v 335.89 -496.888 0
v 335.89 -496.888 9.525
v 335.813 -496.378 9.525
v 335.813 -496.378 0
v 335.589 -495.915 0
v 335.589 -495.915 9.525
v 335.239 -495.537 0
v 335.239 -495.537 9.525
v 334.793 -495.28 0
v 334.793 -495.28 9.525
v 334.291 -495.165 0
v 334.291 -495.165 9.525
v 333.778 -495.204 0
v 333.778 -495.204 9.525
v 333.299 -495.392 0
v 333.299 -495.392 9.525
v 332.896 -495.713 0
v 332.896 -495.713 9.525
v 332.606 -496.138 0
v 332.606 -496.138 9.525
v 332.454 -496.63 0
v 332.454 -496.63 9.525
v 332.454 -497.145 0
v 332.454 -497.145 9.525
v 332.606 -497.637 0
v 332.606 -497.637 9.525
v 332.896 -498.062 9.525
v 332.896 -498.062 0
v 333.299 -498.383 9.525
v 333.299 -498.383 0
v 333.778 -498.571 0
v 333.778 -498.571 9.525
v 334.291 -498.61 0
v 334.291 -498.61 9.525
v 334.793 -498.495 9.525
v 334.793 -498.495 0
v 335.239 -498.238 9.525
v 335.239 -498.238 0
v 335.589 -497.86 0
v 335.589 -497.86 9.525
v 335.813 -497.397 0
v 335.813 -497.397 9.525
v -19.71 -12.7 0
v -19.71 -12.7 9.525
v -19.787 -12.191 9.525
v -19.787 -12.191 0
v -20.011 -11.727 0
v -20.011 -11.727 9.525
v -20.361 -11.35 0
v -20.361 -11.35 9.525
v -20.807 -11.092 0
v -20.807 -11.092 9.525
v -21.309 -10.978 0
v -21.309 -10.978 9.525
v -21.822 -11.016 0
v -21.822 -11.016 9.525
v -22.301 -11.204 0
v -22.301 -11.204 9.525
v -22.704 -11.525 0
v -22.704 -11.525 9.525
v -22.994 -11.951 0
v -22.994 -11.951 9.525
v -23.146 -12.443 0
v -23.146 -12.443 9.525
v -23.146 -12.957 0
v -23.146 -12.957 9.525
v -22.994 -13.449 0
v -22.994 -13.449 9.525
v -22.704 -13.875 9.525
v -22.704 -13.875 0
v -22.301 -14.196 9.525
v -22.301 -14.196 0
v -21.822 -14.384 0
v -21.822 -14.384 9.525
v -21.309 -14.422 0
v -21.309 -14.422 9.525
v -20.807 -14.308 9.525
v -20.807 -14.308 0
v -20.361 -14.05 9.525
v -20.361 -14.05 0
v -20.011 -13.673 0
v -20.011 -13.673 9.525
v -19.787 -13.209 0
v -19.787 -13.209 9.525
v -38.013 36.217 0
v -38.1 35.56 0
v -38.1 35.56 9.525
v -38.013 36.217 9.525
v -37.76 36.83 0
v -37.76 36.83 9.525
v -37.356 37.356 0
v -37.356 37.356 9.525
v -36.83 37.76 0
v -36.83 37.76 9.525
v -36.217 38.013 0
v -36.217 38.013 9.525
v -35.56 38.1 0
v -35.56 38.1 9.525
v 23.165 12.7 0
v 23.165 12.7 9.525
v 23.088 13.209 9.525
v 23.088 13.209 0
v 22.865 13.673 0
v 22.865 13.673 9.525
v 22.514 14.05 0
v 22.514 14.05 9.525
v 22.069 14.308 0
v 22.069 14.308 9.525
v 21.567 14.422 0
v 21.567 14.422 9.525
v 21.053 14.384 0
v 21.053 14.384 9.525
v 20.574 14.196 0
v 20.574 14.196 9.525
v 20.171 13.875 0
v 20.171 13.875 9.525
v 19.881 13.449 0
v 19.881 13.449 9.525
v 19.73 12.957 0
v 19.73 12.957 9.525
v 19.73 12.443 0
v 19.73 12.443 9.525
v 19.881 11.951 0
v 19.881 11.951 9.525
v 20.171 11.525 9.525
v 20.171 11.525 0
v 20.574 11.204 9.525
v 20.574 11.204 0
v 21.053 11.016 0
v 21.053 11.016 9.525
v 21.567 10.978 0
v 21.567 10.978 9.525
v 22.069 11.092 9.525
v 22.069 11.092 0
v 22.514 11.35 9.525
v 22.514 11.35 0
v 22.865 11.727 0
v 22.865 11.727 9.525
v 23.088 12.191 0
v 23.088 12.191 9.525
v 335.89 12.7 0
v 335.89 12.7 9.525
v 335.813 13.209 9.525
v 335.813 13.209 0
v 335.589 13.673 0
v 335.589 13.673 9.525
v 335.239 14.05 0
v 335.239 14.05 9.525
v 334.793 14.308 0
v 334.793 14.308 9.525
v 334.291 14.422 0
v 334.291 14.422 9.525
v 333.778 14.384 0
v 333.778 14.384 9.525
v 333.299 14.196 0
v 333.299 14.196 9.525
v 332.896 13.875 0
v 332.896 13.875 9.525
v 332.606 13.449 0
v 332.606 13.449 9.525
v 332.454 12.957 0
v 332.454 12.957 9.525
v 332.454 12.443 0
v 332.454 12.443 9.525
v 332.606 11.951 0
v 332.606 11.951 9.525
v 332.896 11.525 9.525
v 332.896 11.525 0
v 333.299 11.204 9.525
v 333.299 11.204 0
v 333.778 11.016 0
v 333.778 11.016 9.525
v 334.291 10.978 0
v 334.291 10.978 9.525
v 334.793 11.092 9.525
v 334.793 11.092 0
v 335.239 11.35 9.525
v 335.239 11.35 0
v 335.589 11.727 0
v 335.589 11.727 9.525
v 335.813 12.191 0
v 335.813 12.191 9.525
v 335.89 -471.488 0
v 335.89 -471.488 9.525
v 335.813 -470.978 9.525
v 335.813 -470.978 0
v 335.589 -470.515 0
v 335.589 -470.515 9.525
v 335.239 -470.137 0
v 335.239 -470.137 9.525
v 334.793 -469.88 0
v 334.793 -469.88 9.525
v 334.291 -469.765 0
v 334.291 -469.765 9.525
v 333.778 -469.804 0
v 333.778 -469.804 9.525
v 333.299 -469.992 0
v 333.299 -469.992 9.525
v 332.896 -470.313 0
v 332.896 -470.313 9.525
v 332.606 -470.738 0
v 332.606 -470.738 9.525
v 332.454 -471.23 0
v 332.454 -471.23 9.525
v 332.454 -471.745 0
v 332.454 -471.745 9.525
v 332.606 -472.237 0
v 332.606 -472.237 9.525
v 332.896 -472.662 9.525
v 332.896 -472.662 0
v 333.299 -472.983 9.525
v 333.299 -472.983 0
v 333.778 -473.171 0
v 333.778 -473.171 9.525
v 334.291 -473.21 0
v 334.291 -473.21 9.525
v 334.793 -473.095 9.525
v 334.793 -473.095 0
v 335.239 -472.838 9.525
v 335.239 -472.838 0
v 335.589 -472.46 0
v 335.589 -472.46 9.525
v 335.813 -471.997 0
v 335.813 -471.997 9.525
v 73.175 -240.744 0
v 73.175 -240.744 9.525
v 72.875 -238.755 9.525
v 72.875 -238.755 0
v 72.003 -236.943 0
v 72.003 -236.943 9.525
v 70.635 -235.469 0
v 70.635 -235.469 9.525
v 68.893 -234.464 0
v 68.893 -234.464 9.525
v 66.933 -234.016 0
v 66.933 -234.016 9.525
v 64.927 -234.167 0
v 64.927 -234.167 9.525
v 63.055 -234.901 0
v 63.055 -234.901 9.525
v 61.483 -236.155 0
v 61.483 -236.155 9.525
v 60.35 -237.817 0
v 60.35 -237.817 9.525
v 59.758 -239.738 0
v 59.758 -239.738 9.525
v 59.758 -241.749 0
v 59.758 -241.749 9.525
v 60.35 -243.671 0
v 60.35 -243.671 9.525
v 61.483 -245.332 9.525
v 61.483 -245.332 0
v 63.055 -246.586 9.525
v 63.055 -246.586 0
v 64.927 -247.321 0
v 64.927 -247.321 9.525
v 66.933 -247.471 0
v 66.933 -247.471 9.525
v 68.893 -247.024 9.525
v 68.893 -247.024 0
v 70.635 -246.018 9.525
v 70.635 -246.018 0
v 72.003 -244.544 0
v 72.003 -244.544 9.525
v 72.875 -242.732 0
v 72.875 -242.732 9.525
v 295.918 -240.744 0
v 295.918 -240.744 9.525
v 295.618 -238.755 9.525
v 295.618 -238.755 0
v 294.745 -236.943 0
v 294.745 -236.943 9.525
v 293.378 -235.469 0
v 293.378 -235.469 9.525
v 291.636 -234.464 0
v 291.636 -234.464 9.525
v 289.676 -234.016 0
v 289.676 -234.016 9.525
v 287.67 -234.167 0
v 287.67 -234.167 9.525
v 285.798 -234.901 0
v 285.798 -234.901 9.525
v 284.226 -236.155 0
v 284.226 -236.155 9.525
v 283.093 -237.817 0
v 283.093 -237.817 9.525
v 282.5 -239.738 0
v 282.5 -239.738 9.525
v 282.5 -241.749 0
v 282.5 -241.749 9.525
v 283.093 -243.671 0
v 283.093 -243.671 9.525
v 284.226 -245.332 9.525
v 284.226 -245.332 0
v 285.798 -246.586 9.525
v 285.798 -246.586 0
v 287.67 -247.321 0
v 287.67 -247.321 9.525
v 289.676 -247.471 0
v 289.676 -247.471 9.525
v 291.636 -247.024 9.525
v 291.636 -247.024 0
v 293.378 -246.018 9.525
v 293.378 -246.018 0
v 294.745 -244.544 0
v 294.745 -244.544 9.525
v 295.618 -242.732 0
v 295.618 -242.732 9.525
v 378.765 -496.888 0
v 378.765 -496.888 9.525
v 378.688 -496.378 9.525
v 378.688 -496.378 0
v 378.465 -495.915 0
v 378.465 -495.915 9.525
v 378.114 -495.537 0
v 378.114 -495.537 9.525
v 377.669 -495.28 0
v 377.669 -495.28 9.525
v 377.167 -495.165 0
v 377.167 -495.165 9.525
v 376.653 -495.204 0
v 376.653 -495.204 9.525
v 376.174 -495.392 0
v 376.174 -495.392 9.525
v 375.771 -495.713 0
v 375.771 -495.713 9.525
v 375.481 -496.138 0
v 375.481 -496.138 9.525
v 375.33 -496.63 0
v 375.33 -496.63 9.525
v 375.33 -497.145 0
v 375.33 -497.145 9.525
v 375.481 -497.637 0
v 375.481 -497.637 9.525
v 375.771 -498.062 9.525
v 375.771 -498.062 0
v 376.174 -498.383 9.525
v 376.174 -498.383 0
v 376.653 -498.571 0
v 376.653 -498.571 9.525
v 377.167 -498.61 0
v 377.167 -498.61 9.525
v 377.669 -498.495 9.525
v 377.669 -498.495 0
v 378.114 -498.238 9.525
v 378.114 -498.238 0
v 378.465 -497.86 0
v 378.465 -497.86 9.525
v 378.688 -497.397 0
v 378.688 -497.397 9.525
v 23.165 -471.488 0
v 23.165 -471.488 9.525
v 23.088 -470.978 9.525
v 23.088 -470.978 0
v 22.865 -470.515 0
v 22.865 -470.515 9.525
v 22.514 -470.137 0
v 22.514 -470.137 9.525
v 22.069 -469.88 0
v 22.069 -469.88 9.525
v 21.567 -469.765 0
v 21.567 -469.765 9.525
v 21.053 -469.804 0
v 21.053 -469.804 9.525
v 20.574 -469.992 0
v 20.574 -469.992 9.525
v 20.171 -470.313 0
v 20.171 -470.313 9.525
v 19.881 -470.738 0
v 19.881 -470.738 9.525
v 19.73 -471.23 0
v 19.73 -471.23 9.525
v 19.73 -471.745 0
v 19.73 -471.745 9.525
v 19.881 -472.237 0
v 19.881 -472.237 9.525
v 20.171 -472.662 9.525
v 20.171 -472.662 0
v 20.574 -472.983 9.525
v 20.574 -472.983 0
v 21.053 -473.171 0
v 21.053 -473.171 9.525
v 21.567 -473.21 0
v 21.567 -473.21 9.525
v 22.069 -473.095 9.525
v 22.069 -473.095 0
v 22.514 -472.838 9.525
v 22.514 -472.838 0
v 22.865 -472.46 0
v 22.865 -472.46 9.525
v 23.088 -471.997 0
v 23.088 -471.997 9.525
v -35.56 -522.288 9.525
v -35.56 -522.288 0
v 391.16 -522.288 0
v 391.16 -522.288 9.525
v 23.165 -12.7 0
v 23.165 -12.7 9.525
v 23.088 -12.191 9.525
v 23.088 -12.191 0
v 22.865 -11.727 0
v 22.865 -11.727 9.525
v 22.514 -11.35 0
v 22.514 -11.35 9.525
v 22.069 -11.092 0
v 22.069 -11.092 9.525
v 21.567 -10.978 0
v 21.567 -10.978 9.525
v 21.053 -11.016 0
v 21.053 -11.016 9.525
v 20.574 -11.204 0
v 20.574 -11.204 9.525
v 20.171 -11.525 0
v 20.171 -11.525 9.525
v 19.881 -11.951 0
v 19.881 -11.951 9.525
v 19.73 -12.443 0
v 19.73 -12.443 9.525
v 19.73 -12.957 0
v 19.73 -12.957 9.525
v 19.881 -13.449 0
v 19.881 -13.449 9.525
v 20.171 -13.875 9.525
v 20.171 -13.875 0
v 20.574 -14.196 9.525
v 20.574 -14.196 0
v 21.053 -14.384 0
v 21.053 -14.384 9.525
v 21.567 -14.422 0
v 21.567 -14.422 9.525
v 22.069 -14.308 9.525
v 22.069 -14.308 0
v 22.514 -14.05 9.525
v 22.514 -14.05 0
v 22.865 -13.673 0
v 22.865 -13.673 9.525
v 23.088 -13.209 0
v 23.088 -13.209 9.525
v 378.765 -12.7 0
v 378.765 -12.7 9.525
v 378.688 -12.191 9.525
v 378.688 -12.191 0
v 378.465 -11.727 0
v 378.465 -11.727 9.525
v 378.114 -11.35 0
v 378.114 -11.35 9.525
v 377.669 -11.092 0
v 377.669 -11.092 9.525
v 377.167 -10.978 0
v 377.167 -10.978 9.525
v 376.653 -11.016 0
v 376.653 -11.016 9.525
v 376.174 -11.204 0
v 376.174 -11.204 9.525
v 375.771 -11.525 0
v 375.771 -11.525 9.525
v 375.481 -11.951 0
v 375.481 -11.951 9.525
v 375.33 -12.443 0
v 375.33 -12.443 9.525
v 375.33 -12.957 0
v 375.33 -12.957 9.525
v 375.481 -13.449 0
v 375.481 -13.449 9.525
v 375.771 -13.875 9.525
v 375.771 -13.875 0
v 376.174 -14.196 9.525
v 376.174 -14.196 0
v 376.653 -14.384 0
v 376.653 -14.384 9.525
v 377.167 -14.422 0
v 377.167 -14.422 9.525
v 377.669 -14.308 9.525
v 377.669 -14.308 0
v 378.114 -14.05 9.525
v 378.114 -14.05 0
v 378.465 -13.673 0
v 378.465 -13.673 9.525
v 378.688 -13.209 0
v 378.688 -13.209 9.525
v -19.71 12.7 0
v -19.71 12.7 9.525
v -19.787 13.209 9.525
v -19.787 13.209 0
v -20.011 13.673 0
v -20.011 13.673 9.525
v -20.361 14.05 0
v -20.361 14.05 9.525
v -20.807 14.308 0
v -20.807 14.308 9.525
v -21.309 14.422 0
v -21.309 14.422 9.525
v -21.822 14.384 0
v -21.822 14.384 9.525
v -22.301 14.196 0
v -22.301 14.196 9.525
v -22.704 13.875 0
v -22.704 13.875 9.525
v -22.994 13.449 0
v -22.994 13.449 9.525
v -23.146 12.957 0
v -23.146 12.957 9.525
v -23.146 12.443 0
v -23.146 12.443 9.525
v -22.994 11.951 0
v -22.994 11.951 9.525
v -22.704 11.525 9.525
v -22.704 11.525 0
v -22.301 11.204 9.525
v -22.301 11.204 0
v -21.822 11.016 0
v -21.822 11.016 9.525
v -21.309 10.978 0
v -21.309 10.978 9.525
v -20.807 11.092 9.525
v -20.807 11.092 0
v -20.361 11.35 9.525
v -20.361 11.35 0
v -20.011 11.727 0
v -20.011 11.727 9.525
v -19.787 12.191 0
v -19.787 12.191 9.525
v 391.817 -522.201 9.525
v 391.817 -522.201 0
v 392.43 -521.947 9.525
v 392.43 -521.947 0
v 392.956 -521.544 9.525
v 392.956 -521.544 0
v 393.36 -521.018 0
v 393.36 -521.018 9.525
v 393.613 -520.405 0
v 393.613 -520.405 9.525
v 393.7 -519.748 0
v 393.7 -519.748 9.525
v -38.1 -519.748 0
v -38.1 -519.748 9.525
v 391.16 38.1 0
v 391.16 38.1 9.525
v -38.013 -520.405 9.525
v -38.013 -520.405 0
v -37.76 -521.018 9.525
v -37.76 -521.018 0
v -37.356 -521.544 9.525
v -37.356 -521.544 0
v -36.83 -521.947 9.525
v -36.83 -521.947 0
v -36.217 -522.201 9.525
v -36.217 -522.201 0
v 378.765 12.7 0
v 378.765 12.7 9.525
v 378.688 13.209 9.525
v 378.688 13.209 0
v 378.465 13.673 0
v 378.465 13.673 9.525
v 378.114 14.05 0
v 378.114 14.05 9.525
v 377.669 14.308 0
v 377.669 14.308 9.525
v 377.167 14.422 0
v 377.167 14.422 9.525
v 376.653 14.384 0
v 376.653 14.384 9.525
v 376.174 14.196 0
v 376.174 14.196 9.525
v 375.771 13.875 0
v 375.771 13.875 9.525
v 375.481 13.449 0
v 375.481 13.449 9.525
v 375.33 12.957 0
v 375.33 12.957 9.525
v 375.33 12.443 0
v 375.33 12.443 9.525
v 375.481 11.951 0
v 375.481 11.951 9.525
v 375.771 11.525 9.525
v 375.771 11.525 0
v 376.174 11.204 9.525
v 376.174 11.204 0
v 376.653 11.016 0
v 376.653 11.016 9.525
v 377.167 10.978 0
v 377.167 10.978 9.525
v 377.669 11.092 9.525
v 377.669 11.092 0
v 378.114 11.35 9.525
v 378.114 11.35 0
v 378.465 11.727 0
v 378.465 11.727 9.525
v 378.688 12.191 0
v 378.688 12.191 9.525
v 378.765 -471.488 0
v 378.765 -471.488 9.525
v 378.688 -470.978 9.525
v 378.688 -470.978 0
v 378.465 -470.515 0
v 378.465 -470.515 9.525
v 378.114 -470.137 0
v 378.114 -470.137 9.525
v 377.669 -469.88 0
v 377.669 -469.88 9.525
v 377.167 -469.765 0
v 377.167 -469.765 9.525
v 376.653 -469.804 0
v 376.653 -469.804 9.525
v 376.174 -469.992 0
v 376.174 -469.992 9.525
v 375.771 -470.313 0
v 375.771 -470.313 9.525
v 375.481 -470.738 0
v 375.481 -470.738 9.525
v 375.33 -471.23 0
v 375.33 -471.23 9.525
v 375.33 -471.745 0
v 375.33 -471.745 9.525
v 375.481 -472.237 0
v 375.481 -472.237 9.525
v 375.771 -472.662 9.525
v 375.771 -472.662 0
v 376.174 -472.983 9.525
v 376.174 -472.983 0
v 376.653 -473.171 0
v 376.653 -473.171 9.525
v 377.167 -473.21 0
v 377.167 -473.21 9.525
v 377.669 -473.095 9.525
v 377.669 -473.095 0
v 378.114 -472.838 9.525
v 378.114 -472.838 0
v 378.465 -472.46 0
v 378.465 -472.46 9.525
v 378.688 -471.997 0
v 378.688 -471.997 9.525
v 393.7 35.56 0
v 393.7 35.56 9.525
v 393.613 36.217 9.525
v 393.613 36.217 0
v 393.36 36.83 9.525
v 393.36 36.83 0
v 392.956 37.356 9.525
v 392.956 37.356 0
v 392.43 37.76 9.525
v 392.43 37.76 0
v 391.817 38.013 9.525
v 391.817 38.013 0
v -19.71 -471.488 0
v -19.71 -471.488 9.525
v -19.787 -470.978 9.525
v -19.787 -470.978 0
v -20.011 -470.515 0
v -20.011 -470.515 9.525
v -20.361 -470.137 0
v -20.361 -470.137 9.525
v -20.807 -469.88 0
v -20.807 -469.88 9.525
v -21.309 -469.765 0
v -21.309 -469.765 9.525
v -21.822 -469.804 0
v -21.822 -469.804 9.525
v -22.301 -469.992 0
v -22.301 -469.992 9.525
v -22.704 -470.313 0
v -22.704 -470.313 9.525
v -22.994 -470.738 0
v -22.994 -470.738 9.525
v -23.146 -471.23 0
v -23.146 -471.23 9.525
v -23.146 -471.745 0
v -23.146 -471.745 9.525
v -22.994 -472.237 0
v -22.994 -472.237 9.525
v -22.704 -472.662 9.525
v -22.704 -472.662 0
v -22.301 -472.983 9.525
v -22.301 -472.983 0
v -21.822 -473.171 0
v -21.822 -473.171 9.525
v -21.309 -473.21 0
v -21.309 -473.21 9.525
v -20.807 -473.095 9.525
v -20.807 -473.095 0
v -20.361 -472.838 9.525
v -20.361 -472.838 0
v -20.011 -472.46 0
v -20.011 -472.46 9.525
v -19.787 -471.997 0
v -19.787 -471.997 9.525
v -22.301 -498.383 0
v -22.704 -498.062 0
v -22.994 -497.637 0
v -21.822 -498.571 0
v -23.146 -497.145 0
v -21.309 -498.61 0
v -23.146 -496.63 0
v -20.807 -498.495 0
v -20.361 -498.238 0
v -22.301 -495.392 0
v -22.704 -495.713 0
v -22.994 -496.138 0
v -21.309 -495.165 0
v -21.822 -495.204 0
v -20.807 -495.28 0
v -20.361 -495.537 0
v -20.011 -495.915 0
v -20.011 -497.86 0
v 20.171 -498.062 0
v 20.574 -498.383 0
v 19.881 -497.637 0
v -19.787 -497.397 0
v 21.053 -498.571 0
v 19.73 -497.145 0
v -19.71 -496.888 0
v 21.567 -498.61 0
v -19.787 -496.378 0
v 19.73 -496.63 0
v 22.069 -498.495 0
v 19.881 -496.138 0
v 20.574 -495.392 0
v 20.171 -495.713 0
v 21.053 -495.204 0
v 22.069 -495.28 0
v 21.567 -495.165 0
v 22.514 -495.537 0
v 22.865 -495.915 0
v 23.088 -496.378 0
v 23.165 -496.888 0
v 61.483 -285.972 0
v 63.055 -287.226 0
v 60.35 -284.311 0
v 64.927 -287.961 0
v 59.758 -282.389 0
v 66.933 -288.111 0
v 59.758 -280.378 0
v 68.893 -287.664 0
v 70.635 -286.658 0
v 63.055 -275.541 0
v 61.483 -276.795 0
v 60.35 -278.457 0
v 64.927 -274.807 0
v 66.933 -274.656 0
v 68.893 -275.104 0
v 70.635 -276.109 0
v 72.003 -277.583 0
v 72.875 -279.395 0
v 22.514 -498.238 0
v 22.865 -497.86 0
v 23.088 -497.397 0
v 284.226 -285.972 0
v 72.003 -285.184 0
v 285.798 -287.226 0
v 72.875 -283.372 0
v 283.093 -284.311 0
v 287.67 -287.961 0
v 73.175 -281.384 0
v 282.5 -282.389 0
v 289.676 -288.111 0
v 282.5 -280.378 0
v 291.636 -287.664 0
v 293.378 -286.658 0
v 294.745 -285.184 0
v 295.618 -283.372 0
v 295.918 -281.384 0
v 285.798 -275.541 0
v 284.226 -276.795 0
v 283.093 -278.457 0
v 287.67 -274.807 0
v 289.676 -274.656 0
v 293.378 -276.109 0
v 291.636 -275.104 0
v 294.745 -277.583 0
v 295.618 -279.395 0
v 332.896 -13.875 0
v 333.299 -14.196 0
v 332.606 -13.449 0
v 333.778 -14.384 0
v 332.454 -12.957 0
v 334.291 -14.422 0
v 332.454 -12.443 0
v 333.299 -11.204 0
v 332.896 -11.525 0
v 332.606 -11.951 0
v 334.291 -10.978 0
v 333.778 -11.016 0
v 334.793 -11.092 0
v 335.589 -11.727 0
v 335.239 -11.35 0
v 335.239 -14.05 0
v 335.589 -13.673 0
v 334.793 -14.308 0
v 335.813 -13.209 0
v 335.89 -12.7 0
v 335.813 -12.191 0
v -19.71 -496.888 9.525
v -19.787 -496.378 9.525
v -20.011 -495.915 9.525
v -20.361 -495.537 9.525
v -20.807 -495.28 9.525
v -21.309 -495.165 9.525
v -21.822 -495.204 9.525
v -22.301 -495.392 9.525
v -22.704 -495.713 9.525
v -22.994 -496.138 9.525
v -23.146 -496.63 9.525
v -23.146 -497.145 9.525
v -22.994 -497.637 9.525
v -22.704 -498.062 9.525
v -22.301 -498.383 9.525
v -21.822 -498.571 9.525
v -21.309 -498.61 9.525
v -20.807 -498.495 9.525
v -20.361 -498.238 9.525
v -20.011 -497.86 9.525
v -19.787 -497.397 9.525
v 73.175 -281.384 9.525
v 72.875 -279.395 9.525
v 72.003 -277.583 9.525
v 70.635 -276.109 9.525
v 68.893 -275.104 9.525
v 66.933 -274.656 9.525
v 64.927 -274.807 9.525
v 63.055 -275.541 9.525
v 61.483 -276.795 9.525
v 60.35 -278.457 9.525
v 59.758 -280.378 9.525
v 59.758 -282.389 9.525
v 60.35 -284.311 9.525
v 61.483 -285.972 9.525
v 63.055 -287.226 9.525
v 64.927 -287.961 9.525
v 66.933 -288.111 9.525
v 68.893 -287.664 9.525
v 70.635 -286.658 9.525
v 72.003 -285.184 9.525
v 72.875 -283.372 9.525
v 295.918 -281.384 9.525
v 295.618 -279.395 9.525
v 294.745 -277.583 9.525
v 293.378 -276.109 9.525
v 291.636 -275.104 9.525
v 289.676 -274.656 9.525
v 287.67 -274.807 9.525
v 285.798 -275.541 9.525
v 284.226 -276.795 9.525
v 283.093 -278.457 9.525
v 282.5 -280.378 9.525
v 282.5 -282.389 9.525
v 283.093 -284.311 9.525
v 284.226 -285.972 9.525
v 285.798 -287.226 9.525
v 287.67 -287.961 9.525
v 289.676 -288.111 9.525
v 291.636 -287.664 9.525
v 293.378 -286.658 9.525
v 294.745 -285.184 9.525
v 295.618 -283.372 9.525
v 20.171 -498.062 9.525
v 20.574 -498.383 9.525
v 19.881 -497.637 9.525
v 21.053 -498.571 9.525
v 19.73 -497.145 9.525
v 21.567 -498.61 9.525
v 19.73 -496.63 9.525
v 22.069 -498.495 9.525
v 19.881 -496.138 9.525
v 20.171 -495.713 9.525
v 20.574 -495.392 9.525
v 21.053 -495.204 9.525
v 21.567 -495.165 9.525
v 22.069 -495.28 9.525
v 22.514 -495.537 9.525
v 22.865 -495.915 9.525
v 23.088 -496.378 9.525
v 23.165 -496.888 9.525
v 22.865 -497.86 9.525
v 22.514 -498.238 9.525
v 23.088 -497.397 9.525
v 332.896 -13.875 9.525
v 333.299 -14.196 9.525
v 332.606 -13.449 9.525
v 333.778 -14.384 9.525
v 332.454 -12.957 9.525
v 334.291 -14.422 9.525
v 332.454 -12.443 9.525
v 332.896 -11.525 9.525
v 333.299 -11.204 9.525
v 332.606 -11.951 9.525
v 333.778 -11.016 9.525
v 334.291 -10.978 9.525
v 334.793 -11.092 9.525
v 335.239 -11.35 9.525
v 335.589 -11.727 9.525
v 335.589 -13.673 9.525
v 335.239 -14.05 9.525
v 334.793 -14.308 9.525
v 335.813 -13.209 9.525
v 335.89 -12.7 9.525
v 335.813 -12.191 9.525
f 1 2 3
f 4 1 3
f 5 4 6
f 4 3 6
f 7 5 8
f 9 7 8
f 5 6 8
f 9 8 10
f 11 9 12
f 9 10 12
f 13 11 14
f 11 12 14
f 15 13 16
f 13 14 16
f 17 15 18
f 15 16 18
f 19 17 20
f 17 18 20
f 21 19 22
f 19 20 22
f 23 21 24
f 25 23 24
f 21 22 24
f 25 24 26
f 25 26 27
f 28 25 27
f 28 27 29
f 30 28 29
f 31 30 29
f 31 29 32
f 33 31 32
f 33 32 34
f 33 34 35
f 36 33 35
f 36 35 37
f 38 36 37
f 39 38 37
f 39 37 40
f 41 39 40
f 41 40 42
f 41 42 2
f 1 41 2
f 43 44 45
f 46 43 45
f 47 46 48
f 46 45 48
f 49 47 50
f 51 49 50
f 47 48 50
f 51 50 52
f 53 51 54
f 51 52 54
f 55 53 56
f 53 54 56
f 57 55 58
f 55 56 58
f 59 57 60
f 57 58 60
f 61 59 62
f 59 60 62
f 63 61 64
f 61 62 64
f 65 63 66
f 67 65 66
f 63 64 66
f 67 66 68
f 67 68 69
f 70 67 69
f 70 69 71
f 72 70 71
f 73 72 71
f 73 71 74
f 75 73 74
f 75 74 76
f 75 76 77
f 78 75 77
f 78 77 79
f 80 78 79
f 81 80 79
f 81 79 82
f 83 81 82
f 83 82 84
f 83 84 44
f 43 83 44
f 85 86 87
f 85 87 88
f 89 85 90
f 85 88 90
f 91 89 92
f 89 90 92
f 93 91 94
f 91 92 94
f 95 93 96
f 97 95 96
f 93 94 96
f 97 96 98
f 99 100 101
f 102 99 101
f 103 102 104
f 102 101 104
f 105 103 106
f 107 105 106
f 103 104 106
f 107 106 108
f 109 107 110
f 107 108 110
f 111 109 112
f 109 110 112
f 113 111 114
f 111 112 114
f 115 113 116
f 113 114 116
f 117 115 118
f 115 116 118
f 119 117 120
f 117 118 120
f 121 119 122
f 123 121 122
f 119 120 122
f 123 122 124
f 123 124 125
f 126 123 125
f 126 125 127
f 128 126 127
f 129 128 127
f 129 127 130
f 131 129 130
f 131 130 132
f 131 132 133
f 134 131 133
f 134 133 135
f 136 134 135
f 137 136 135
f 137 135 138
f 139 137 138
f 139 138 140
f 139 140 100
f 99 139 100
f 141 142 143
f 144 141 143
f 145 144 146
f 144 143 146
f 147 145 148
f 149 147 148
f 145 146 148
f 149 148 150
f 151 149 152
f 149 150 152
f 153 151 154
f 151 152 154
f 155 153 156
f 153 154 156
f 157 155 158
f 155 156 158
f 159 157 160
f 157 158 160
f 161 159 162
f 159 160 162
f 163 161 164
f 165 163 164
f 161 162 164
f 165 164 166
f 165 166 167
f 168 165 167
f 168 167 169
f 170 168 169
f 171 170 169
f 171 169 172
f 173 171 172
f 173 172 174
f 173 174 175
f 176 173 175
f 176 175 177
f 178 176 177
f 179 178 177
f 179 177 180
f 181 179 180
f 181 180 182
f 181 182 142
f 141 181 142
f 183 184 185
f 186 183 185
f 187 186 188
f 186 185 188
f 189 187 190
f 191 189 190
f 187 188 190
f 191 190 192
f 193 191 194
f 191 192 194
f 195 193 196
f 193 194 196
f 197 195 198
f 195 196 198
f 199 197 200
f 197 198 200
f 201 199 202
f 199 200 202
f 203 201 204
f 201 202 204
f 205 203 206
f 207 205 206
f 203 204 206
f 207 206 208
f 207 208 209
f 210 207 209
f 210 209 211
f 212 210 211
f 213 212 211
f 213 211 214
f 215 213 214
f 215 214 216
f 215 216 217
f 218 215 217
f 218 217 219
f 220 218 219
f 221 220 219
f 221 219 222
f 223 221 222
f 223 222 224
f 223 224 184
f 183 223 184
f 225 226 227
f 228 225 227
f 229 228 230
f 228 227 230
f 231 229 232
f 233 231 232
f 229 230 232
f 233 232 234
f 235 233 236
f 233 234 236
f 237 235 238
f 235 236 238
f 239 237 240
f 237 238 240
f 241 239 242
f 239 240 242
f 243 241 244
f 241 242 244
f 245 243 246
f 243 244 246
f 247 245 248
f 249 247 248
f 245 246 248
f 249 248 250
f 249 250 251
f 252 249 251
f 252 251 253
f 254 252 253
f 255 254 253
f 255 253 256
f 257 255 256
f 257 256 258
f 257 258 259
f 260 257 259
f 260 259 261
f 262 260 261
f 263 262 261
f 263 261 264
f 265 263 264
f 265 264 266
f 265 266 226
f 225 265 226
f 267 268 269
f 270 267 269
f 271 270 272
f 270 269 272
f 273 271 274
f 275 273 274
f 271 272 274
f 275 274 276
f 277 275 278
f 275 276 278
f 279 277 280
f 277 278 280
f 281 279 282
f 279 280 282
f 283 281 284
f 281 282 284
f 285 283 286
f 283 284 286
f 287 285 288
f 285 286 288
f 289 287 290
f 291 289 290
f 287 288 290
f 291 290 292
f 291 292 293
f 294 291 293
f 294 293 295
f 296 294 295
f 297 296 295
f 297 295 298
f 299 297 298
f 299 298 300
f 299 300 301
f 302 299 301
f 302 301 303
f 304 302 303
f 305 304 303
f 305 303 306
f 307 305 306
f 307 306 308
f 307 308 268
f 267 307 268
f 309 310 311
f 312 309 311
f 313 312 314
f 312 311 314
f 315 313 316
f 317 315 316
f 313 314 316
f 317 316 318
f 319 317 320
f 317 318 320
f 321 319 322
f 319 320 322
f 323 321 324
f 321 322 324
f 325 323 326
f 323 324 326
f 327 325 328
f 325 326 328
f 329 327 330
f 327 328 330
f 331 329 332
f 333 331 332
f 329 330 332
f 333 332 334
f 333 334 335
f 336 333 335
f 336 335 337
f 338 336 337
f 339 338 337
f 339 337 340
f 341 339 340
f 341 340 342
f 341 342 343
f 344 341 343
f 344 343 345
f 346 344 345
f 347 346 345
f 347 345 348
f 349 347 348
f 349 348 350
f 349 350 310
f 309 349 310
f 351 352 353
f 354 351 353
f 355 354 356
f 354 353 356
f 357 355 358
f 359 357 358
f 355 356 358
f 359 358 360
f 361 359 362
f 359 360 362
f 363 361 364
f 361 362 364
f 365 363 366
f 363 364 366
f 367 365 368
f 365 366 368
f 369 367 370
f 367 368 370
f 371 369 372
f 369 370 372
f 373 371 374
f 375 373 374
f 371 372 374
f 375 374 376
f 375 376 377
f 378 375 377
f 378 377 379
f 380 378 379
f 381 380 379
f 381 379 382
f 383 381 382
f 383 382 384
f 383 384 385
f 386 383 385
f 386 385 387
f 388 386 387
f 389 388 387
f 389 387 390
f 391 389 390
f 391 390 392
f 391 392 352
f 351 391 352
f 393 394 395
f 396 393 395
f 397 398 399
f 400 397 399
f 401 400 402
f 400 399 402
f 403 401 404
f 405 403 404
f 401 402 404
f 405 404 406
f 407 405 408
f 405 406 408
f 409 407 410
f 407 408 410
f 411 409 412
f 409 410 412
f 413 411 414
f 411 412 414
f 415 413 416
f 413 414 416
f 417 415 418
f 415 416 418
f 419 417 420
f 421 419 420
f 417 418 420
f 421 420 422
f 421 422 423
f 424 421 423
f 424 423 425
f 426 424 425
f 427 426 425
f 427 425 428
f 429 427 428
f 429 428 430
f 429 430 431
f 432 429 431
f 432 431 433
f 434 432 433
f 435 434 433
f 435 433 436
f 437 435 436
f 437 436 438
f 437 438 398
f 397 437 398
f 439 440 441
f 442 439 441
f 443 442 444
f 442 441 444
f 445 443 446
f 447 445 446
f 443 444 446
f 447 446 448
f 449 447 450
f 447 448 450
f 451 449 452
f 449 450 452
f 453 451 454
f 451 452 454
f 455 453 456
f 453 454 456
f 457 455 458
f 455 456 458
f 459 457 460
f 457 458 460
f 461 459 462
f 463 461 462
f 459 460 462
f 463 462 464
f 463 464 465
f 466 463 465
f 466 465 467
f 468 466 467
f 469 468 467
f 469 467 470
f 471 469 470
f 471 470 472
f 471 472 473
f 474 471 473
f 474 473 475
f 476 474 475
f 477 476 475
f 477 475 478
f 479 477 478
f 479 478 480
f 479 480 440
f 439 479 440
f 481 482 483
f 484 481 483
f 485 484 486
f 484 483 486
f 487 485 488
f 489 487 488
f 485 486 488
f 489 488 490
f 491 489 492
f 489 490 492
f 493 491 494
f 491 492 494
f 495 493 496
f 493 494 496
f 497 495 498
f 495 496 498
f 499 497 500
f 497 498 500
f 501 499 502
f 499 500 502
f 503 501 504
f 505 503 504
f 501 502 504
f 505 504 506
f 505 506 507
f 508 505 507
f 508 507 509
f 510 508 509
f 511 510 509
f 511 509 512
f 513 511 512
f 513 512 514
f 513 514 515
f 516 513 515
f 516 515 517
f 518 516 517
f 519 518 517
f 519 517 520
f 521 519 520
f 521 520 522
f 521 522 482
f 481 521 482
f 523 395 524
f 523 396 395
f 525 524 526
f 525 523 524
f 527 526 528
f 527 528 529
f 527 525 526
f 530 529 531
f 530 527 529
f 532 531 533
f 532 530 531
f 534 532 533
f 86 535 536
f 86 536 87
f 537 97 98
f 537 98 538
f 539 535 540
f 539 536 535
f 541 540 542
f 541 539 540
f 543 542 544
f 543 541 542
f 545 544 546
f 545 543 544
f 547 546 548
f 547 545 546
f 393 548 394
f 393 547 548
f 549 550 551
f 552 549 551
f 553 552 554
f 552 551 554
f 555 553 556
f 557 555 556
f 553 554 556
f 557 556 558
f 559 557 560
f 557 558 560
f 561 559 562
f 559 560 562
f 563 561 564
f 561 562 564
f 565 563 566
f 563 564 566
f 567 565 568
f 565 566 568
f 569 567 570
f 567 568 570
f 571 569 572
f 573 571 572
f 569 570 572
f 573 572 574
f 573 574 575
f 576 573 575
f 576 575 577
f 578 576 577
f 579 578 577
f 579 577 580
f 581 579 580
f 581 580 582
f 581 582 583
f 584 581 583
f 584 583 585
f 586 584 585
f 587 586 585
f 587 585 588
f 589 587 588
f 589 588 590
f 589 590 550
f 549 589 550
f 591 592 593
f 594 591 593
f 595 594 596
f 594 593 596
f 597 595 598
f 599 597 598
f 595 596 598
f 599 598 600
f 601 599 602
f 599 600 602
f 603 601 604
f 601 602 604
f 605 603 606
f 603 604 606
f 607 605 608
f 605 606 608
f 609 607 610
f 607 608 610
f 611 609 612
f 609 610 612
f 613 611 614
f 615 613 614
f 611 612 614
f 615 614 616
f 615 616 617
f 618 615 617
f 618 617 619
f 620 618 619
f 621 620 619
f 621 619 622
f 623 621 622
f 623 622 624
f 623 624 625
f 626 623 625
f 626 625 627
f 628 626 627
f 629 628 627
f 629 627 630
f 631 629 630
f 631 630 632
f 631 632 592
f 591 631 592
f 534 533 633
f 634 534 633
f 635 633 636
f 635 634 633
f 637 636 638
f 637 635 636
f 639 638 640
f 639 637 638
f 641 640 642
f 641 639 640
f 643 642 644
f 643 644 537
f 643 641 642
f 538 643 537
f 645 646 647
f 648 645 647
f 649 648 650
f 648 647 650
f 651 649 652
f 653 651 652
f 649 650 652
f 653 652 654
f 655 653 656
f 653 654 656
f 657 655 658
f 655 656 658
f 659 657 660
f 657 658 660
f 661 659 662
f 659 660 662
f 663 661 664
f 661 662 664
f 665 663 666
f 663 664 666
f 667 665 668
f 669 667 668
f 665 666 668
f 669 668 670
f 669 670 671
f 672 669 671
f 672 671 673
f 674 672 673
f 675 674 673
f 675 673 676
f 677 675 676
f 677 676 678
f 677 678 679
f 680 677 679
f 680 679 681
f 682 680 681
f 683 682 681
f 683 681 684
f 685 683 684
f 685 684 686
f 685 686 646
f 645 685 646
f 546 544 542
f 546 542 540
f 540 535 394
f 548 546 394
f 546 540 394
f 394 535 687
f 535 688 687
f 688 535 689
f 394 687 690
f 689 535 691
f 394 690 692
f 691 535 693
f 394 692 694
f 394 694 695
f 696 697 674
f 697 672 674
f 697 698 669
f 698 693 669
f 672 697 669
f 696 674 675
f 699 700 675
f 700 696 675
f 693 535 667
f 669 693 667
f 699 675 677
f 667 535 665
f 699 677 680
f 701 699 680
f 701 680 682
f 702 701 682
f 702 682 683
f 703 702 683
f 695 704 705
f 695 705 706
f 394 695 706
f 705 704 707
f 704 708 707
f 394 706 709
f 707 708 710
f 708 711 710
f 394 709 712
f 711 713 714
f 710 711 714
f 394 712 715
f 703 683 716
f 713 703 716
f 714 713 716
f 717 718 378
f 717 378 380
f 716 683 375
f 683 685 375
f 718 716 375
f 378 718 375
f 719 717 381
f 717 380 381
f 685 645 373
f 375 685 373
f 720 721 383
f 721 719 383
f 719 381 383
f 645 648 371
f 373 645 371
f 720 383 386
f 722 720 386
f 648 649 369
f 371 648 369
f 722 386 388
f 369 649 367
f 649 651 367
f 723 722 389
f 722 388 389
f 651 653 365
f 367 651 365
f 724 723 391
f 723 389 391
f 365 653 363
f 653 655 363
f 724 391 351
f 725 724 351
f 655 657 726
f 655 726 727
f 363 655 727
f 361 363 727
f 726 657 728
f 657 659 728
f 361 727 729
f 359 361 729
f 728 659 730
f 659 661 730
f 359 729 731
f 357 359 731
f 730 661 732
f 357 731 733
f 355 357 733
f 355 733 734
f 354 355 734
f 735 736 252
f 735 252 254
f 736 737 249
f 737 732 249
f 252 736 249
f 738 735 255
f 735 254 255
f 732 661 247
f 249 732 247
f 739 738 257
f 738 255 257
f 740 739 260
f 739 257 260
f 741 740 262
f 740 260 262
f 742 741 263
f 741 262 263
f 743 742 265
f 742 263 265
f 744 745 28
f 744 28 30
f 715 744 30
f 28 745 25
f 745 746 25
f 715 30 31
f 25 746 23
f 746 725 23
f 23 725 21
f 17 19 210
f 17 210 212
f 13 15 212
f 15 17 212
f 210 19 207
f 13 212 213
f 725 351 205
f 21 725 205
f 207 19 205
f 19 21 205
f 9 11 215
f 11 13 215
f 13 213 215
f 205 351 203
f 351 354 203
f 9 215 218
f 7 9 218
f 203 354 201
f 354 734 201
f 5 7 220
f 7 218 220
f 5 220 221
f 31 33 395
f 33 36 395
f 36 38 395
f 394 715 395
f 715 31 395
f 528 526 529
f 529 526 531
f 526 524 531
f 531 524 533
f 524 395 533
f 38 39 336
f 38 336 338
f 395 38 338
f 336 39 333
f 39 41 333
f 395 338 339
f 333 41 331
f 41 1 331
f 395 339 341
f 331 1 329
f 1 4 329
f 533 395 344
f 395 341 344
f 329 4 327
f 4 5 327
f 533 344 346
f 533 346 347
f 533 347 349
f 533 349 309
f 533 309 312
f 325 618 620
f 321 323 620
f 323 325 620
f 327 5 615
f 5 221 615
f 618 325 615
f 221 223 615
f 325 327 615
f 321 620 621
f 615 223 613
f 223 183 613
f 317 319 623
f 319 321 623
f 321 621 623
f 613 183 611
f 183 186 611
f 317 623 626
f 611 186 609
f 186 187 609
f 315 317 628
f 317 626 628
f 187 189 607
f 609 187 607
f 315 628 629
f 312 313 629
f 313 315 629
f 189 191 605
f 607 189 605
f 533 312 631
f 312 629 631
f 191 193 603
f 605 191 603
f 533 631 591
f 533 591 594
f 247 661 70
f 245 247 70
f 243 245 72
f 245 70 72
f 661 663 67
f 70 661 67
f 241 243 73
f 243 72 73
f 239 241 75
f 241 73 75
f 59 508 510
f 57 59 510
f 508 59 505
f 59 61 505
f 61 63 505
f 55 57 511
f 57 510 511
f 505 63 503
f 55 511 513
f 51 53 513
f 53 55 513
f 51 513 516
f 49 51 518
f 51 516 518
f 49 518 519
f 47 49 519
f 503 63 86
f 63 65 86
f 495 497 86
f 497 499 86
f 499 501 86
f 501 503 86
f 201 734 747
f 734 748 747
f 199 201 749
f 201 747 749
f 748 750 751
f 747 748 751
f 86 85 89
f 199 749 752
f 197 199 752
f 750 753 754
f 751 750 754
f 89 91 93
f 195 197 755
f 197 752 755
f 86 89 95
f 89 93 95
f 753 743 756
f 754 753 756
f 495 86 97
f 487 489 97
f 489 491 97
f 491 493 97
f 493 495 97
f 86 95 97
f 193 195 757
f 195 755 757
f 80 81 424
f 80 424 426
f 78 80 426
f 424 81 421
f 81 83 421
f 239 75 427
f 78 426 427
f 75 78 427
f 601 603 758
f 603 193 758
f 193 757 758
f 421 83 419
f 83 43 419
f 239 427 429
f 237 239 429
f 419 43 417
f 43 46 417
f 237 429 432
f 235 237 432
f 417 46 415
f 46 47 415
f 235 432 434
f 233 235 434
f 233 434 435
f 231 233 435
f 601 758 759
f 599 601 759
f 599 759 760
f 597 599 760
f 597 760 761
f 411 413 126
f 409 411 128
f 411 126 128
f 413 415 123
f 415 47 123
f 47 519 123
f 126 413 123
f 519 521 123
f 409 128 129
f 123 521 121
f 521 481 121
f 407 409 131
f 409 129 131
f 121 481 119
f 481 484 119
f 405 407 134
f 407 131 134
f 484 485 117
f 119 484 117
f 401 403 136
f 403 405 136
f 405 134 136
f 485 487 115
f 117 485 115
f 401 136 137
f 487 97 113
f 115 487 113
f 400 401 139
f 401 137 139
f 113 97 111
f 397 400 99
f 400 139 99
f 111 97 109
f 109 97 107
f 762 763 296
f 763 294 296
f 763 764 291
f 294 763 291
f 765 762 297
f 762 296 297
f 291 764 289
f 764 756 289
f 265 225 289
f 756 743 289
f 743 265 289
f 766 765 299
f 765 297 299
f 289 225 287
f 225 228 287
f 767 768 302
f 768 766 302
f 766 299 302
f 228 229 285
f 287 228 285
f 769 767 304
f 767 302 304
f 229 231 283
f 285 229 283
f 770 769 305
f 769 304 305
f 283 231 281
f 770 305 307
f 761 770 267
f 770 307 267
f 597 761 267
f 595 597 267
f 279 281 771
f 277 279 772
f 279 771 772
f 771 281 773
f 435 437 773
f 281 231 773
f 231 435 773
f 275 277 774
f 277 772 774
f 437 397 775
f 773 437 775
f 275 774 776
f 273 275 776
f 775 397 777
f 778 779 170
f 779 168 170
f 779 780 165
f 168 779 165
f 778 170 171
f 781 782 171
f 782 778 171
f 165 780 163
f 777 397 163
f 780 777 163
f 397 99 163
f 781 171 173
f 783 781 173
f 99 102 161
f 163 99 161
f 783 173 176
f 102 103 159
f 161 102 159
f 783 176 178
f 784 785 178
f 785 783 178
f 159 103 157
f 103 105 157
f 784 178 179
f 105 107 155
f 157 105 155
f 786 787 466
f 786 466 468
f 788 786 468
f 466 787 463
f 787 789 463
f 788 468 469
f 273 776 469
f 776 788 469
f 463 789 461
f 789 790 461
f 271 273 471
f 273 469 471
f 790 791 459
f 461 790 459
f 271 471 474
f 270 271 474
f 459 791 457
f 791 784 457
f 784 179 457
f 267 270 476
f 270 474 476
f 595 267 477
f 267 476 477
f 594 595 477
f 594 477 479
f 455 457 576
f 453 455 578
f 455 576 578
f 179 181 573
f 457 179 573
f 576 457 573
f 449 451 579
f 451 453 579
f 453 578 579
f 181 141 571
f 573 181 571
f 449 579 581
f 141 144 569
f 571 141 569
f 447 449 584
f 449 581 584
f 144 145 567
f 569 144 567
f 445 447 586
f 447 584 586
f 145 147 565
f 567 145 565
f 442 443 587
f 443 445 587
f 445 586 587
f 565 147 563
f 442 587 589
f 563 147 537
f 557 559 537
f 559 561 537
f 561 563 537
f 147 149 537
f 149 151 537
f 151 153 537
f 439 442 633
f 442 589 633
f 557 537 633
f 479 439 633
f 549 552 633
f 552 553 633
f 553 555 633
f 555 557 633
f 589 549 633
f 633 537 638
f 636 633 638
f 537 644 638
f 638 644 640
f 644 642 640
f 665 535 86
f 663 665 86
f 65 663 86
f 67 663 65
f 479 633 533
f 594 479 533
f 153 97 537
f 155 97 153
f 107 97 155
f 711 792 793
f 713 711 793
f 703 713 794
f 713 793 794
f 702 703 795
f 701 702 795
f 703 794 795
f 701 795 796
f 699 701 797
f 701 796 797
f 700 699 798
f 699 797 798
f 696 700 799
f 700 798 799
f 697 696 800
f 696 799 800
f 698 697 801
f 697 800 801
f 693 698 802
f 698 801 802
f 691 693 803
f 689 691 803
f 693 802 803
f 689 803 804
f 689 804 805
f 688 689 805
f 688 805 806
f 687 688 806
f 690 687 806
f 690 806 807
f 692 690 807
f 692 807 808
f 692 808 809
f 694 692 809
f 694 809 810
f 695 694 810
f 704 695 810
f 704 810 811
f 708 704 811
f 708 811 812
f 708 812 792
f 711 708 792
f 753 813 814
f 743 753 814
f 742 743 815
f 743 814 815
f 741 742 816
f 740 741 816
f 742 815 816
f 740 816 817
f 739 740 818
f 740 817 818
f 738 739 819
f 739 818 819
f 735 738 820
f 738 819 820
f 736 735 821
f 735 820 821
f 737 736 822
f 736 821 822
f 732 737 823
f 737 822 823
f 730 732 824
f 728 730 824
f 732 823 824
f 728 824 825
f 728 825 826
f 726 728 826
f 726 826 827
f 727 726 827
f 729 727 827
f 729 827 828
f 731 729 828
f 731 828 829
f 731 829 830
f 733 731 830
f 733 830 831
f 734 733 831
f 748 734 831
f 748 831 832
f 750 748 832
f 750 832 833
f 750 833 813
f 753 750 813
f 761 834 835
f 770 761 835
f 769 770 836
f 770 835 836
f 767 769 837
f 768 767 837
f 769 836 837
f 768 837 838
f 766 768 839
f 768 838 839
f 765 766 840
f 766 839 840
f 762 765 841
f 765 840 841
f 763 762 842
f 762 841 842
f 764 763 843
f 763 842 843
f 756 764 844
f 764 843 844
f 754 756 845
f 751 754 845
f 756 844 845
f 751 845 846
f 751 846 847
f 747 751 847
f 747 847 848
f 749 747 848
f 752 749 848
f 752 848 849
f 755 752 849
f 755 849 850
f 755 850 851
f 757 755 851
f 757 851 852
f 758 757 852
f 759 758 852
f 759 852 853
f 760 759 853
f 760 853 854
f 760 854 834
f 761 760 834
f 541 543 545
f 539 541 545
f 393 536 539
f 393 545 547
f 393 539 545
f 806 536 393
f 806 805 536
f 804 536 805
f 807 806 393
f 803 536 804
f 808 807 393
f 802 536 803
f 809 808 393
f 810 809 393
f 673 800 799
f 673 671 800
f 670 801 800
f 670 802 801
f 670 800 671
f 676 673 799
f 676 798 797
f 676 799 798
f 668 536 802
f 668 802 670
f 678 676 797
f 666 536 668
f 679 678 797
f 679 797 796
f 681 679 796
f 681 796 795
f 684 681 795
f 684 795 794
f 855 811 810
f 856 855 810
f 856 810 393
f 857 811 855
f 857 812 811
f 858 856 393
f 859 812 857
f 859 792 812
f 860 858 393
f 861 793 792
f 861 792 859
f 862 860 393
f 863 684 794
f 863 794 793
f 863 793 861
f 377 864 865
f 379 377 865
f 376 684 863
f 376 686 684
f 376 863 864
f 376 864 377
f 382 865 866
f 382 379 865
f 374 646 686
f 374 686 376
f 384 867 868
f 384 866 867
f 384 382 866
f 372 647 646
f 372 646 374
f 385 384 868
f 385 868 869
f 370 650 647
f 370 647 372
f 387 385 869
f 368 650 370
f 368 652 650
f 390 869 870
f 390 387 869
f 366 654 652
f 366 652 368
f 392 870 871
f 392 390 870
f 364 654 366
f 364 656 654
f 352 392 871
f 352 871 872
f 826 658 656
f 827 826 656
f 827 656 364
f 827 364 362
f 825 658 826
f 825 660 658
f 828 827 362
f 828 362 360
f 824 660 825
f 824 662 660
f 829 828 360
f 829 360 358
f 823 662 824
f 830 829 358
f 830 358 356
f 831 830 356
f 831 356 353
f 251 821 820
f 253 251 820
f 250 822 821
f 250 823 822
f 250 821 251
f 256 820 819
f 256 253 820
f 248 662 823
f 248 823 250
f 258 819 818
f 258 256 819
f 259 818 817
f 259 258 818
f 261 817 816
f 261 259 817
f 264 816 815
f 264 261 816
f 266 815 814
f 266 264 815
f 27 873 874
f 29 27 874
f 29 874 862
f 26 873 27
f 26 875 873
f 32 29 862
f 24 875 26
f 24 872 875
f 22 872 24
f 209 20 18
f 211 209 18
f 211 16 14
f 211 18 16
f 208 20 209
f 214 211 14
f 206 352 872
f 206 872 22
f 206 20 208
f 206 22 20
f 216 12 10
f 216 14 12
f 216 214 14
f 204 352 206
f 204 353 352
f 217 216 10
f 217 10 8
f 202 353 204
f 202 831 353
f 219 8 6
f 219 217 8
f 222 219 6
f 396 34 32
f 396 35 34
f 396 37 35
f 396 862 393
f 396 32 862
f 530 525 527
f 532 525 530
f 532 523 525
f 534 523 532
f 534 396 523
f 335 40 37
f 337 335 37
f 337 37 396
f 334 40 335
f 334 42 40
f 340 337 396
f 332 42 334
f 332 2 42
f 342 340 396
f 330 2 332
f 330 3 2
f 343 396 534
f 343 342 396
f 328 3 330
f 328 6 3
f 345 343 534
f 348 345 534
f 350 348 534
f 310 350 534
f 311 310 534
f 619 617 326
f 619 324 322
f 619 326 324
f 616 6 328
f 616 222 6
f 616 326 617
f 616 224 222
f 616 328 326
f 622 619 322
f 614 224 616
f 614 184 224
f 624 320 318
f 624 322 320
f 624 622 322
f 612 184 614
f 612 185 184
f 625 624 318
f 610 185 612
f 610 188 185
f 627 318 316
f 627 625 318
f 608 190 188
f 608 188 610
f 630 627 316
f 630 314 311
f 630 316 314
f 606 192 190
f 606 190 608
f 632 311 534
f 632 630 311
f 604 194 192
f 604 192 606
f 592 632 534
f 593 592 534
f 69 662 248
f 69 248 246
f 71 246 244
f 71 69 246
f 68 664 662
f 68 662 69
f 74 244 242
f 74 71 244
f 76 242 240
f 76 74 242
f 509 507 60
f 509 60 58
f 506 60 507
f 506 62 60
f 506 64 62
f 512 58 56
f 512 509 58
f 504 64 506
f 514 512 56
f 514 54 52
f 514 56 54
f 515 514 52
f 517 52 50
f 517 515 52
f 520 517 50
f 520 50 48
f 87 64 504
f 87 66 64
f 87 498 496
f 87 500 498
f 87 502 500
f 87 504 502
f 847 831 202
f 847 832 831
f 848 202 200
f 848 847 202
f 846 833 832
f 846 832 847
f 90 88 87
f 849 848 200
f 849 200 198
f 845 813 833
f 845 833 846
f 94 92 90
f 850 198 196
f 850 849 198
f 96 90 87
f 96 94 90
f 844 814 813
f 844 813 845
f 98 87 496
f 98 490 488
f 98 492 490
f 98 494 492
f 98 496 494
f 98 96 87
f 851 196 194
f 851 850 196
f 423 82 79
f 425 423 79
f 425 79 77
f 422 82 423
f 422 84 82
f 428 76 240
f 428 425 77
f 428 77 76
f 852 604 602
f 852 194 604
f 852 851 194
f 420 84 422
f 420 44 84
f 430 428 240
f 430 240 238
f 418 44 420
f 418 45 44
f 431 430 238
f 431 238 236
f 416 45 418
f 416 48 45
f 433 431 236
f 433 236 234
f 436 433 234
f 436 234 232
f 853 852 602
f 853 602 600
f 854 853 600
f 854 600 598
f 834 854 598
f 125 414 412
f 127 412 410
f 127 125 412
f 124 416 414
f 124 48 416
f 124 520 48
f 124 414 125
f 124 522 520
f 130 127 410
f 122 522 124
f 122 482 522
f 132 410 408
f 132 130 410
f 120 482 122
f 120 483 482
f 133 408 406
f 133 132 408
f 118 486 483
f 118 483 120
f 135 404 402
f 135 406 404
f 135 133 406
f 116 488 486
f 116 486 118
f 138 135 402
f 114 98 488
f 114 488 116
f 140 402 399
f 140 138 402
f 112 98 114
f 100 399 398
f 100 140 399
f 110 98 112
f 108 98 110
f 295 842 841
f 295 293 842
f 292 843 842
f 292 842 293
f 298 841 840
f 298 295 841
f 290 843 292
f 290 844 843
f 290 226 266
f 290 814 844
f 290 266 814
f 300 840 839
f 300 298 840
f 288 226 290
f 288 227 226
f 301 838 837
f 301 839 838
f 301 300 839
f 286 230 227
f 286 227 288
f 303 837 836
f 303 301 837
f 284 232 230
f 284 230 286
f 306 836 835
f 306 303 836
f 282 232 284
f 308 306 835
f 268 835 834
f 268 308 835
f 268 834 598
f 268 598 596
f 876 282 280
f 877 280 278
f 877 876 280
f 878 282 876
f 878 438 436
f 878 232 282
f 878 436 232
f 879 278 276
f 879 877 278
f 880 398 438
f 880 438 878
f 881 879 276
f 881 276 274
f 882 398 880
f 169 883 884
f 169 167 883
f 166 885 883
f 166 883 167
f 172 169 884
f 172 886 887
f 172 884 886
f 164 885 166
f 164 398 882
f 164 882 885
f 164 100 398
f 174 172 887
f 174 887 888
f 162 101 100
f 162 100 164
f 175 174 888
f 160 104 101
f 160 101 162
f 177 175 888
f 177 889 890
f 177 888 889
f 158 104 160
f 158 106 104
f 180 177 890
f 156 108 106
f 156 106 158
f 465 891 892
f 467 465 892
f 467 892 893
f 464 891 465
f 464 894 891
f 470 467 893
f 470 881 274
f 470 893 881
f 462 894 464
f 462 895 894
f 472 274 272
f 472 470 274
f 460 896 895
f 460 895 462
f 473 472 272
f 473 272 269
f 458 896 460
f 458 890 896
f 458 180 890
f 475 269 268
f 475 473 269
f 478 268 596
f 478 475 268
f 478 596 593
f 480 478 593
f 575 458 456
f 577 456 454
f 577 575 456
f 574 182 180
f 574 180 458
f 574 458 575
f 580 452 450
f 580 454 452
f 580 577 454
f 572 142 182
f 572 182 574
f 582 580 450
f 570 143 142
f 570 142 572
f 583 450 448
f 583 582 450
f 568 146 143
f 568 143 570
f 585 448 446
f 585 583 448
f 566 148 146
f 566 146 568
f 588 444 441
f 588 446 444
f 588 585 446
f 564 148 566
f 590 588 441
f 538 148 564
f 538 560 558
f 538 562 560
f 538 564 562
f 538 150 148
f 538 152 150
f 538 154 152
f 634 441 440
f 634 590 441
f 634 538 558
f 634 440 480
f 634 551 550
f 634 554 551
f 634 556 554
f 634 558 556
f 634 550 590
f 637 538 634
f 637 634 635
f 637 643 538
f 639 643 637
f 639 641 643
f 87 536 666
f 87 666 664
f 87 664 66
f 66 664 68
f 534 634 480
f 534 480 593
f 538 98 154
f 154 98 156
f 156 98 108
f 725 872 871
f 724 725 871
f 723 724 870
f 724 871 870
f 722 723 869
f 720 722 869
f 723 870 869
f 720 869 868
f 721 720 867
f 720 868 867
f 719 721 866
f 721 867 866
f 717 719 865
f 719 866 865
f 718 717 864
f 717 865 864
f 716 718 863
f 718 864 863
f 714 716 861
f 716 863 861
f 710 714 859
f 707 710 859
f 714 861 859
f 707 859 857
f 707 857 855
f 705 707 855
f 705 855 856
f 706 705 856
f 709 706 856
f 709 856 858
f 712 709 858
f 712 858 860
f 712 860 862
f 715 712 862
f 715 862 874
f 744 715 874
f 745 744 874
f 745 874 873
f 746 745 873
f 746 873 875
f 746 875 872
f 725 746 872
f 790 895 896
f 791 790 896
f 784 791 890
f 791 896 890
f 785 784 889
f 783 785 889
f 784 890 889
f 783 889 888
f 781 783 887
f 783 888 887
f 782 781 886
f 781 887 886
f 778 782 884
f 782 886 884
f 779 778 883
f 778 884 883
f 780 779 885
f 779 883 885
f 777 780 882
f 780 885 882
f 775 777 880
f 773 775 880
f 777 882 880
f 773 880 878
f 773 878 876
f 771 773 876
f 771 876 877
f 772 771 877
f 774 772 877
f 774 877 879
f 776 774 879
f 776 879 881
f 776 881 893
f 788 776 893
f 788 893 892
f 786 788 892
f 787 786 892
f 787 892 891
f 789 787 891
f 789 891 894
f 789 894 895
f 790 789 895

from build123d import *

# Parameters (mm, degrees)
SKETCH1_W               = 431.8
SKETCH1_H               = 560.3875
BOSS_EXTRUDE1_DEPTH     = 9.525
FILLET1_R               = 2.54
F_1_2_CLEARANCE_HOLE1_D = 13.49248
F_5_CLEARANCE_HOLE1_D   = 3.4544


with BuildPart() as part:
    # Sketch1 → Boss-Extrude1 (new body)
    with BuildSketch(Plane.XY):
        with Locations((177.8, -242.09375)):
            Rectangle(SKETCH1_W, SKETCH1_H)
    extrude(amount=BOSS_EXTRUDE1_DEPTH)

    # Fillet1
    fillet1_edges = [part.edges().sort_by_distance(p)[0] for p in [
        (-38.1, 38.1, 4.7625),
        (393.7, 38.1, 4.7625),
        (393.7, -522.2875, 4.7625),
        (-38.1, -522.2875, 4.7625),
    ]]
    fillet(fillet1_edges, radius=FILLET1_R)

    # 1/2 Clearance Hole1 (through all)
    with Locations(Plane(origin=(0, 0, 0), x_dir=(-1, 0, 0), z_dir=(0, 0, -1))):
        with Locations((-66.42862, -240.74374), (-289.17138, -240.74374), (-289.17138, -281.38374), (-66.42862, -281.38374)):
            Hole(F_1_2_CLEARANCE_HOLE1_D / 2)

    # #5 Clearance Hole1 (through all)
    with Locations(Plane(origin=(0, 0, 0), x_dir=(-1, 0, 0), z_dir=(0, 0, -1))):
        with Locations((-377.0376, 12.7), (-377.0376, -12.7), (-334.1624, 12.7), (-334.1624, -12.7), (-21.4376, -12.7), (21.4376, -12.7), (21.4376, 12.7), (-21.4376, 12.7), (-21.4376, -496.8875), (21.4376, -496.8875), (21.4376, -471.4875), (-21.4376, -471.4875), (-334.1624, -471.4875), (-334.1624, -496.8875), (-377.0376, -471.4875), (-377.0376, -496.8875)):
            Hole(F_5_CLEARANCE_HOLE1_D / 2)


solid = part.part
